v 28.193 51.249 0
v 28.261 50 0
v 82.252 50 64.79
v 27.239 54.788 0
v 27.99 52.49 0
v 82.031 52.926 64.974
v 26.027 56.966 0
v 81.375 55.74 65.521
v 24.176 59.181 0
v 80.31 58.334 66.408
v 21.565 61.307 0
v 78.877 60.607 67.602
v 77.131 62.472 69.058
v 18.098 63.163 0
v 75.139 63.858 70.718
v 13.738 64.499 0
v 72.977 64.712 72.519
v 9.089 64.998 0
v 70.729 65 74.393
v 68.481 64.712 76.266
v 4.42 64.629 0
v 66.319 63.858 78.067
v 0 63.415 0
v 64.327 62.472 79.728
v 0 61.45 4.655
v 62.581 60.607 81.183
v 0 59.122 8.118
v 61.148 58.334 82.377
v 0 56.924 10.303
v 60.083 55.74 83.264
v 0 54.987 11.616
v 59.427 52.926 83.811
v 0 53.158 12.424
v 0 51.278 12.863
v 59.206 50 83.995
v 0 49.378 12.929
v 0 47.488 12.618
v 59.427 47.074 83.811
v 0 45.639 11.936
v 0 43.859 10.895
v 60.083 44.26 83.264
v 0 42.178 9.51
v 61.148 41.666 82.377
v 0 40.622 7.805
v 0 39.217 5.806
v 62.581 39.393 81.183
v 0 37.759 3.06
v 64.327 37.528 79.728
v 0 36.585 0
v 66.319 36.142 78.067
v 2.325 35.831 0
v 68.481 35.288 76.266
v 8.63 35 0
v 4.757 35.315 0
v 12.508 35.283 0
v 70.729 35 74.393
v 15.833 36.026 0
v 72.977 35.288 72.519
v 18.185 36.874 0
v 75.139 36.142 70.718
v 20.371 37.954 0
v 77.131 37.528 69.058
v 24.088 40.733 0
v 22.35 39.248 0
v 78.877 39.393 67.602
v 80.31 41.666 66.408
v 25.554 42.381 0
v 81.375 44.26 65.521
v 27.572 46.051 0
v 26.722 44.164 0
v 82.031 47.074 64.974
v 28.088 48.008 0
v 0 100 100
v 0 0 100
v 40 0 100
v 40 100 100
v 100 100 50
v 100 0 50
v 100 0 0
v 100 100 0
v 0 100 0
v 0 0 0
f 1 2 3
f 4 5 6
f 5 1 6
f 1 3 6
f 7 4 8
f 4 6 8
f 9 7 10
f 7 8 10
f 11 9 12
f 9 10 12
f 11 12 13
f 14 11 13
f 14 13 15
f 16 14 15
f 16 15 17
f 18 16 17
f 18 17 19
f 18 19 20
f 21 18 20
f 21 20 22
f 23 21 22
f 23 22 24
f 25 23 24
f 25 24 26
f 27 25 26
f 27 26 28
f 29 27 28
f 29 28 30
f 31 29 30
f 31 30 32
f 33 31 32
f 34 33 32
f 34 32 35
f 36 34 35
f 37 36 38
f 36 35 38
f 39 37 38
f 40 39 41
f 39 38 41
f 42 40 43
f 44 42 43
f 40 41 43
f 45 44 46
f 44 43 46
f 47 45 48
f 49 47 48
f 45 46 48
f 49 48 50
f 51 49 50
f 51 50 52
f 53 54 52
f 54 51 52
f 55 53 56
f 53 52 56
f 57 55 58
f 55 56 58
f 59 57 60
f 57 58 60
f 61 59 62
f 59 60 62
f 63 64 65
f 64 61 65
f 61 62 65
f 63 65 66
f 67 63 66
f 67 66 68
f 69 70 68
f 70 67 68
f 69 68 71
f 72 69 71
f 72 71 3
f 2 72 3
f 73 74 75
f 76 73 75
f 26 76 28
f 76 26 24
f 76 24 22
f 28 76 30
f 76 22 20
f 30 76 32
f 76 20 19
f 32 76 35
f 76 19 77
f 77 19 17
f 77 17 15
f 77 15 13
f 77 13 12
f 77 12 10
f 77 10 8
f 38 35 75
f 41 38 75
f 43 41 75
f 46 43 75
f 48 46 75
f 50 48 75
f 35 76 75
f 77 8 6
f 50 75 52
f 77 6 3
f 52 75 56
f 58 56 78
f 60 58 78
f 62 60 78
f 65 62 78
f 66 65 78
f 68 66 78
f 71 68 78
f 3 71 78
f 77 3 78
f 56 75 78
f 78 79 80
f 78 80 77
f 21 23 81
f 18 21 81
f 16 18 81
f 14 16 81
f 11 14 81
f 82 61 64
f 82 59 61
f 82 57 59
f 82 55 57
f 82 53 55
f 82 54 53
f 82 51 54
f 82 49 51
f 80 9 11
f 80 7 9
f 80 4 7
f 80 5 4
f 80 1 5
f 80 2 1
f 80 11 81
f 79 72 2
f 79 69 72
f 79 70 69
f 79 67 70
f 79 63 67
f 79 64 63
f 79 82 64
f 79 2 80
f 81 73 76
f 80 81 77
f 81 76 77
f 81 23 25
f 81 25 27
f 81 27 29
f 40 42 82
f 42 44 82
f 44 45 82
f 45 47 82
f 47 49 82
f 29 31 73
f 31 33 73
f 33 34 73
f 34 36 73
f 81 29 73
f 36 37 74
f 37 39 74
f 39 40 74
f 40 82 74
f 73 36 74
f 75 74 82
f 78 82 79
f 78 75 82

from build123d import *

# Parameters (mm, degrees)
F0_W     = 100
F0_H     = 100
F1_DEPTH = 100
F3_DEPTH = 100.001
F4_R     = 15
F5_DEPTH = 102.4305039463


with BuildPart() as f1:
    # F0 (on Front) → F1 (new body)
    with BuildSketch(Plane.XZ):
        with Locations((50, 50)):
            Rectangle(F0_W, F0_H)
    extrude(amount=-F1_DEPTH)

    # F2 (on face) → F3 (cut, through all)
    with BuildSketch(Plane.XZ):
        Polygon((40, 110), (40, 100), (100, 50), (110, 50), (110, 110), align=None)
    extrude(amount=-F3_DEPTH, mode=Mode.SUBTRACT)

    # F4 (on face) → F5 (cut, through all)
    with BuildSketch(Plane(origin=(65.5737704918, 0, 78.6885245902), x_dir=(0.7682212796, 0, -0.6401843997), z_dir=(0.6401843997, 0, 0.7682212796))):
        with Locations((6.7104112174, 50)):
            Circle(F4_R)
    extrude(amount=-F5_DEPTH, mode=Mode.SUBTRACT)


solid = f1.part
